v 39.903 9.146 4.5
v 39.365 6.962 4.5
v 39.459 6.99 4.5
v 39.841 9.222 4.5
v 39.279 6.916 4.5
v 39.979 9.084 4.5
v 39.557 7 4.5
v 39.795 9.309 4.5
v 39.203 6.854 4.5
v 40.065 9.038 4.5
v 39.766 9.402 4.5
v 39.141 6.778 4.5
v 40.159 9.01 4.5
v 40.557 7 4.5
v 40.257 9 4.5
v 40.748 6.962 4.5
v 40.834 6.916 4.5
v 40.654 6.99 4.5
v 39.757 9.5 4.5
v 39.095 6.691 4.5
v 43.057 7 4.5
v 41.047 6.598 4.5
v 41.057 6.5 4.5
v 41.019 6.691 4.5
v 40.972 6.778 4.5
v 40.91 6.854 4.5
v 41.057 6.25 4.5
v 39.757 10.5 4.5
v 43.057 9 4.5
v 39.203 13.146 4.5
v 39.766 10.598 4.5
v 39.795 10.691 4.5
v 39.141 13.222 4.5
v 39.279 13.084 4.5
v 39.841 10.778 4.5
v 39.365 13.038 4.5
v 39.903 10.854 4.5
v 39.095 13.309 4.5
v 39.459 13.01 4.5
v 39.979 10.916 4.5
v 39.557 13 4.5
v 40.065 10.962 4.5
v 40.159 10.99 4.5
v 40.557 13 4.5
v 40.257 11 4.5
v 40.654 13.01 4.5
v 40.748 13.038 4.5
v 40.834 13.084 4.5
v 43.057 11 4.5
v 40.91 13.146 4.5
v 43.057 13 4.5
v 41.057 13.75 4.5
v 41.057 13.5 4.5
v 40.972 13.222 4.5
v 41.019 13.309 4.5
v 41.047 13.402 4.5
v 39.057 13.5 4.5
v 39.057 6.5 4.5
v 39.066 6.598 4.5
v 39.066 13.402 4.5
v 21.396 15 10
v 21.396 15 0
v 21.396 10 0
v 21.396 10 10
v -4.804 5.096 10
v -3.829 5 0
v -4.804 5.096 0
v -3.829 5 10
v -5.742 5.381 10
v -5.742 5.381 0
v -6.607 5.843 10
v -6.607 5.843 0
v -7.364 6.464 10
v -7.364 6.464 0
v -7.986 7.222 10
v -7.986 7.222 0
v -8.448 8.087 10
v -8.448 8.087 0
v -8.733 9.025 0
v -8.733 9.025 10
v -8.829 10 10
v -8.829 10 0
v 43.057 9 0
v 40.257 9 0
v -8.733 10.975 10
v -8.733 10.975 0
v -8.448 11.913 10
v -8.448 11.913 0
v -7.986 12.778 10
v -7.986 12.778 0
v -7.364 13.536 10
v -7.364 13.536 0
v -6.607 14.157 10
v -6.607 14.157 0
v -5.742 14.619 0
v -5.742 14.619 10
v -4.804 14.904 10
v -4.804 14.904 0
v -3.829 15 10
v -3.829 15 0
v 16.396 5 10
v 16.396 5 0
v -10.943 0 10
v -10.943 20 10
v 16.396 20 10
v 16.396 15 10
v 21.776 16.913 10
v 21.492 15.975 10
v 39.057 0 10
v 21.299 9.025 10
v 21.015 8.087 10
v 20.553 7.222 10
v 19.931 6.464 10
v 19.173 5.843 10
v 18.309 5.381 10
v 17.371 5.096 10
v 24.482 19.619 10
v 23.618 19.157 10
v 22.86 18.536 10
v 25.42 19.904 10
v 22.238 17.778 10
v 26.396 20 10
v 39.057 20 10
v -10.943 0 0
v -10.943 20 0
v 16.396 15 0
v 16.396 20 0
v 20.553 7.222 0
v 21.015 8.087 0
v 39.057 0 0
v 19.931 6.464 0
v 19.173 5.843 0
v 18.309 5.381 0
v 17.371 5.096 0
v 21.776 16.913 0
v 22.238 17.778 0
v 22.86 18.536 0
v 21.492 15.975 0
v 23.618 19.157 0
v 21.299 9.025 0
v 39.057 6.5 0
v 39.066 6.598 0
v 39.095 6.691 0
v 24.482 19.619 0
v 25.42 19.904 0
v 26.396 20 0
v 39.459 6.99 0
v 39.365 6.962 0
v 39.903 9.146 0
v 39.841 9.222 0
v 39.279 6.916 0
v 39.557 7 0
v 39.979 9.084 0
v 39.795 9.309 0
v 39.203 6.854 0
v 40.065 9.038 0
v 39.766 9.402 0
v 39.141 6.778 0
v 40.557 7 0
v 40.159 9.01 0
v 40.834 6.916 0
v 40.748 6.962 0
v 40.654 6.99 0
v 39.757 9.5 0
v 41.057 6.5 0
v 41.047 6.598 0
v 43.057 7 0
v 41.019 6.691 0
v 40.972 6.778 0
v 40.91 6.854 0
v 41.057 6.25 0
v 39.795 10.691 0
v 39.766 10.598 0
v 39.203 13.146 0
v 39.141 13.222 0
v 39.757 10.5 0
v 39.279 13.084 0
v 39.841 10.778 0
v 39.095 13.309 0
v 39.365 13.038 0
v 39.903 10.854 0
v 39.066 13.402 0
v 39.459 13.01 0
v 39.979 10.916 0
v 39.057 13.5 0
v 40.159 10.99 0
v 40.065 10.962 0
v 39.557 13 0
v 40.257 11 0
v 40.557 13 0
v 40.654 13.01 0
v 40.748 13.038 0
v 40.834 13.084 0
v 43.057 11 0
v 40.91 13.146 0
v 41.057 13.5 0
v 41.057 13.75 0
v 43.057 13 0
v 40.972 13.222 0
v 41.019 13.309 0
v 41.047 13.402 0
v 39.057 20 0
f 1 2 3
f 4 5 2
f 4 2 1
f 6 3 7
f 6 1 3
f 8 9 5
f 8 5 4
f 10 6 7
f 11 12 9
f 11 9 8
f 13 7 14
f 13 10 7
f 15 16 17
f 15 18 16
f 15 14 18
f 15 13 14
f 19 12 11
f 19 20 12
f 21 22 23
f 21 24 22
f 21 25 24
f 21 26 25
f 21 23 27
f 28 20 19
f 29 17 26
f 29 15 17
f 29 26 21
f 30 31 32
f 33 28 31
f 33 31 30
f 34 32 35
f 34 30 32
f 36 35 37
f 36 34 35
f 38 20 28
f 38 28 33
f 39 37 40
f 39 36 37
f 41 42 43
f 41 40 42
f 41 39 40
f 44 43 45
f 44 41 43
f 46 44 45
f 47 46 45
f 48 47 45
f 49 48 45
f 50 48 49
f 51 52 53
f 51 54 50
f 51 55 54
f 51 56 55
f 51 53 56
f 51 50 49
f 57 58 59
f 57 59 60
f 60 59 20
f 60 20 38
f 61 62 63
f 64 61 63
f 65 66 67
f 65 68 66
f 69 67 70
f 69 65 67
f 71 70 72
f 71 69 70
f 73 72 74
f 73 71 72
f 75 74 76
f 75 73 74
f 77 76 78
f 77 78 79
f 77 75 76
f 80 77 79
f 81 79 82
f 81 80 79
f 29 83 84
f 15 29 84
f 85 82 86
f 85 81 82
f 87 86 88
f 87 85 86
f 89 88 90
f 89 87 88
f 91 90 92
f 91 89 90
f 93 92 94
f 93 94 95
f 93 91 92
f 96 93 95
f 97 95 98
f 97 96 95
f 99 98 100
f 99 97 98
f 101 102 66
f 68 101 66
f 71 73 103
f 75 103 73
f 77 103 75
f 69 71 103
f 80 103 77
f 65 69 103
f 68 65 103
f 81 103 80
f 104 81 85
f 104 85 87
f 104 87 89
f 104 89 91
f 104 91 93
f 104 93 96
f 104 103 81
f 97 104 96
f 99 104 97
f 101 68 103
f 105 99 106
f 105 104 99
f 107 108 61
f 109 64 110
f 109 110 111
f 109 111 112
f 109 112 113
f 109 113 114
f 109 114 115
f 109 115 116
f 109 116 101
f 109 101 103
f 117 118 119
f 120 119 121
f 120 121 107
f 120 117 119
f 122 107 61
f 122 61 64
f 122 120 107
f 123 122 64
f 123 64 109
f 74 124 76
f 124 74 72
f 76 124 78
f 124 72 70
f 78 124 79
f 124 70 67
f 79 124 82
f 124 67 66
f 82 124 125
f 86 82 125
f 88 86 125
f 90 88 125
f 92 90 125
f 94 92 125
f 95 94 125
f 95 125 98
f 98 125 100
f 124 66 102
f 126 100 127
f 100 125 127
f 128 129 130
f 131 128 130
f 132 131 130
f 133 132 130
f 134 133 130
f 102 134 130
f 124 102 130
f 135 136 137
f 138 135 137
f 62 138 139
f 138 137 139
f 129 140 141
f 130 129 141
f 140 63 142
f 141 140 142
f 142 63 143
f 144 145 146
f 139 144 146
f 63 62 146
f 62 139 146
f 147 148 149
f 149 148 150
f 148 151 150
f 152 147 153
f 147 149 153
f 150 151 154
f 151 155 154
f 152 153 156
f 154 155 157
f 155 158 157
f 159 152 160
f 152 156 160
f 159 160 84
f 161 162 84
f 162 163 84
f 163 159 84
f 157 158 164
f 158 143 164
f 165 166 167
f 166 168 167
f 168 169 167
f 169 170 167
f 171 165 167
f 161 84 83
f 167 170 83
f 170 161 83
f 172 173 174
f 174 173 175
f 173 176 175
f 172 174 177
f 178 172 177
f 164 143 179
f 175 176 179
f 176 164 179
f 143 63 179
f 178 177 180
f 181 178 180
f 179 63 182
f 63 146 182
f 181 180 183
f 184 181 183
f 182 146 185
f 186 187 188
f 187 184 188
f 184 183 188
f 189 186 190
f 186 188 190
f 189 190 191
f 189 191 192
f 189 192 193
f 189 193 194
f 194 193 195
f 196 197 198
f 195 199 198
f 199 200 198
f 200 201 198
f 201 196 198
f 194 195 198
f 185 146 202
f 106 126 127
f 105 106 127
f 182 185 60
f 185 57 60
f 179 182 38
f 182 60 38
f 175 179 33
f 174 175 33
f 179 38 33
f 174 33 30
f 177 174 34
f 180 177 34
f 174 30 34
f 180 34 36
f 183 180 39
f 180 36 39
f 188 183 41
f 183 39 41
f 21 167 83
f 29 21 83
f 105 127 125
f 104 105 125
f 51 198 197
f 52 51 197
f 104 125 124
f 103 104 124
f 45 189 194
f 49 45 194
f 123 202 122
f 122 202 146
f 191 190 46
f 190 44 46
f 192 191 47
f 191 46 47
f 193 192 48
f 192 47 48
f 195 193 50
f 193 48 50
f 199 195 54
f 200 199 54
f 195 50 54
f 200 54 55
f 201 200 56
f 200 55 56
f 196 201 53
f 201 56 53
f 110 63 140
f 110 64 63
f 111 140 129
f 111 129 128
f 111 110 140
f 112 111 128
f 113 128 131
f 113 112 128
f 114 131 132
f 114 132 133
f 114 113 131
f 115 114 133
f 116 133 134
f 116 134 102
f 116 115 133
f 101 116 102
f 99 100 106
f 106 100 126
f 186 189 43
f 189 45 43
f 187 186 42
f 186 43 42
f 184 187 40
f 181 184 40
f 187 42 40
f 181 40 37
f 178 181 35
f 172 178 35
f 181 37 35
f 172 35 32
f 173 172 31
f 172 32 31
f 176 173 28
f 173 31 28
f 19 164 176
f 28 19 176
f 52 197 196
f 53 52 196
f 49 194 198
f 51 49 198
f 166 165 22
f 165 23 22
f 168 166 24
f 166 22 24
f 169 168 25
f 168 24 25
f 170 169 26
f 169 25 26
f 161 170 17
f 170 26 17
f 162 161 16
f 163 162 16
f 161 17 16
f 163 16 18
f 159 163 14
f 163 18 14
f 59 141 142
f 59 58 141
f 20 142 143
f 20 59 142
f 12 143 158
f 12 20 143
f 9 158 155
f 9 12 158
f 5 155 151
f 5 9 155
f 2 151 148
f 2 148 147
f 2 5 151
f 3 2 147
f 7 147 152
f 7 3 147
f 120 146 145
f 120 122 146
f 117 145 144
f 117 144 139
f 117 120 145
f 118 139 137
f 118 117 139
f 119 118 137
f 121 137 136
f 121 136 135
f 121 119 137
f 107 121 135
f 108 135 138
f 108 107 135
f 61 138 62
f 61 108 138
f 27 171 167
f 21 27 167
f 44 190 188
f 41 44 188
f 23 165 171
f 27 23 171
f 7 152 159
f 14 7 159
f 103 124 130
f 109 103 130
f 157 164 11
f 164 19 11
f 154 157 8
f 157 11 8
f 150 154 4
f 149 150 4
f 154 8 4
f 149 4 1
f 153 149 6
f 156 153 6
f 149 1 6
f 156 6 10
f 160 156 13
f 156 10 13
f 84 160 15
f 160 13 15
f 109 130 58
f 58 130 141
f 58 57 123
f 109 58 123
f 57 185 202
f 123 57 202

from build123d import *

# Parameters (mm, degrees)
F0_W     = 10.7198789741
F0_H     = 5
F1_DEPTH = 10
F0_W_2   = 2
F0_H_2   = 2
F0_W_3   = 0.7
F2_DEPTH = 4.5
F3_R     = 4.99999
F4_R     = 0.5


# Not quite as in the source:
# - a fillet or chamfer is up to 0.001 mm smaller than in the source, because OpenCascade refuses the exact size


with BuildPart() as f1:
    # F0 (on Top) → F1 (new body)
    with BuildSketch(Plane.XY):
        Polygon((-10.9434188306, 20), (-10.9434188306, 0), (5.6756753474, 0), (5.6756753474, 5), (-8.8288290426, 5), (-8.8288290426, 15), (5.6756753474, 15), (5.6756753474, 20), align=None)
        Polygon((5.6756753474, 5), (5.6756753474, 0), (39.0565811694, 0), (39.0565811694, 7), (39.0565811694, 9), (39.0565811694, 11), (39.0565811694, 13), (39.0565811694, 20), (21.3955543215, 20), (21.3955543215, 15), (21.3955543215, 5), align=None)
        with Locations((11.0356148345, 17.5)):
            Rectangle(F0_W, F0_H)
    extrude(amount=F1_DEPTH)

    # F0 (on Top) → F2 (join)
    with BuildSketch(Plane.XY):
        Polygon((39.0565811694, 9), (39.0565811694, 7), (41.0565811694, 7), (41.0565811694, 9), (39.7565811694, 9), align=None)
        with Locations((42.0565811694, 8)):
            Rectangle(F0_W_2, F0_H_2)
        Polygon((43.0565811694, 7), (41.0565811694, 7), (41.0565811694, 6.25), align=None)
        Polygon((39.0565811694, 13), (39.0565811694, 11), (39.7565811694, 11), (41.0565811694, 11), (41.0565811694, 13), align=None)
        with Locations((42.0565811694, 12)):
            Rectangle(F0_W_2, F0_H_2)
        Polygon((41.0565811694, 13.75), (41.0565811694, 13), (43.0565811694, 13), align=None)
        with Locations((39.4065811694, 10)):
            Rectangle(F0_W_3, F0_H_2)
    extrude(amount=F2_DEPTH)

    # F3 (radius 5 in the source; OpenCascade refuses exactly that, so slightly less here)
    f3_edges = [f1.edges().sort_by_distance(p)[0] for p in [
        (-8.828829, 15, 5),
        (-8.828829, 5, 5),
        (21.395554, 5, 5),
        (21.395554, 20, 5),
    ]]
    fillet(f3_edges, radius=F3_R)

    # F4
    f4_edges = [f1.edges().sort_by_distance(p)[0] for p in [
        (39.056581, 13, 2.25),
        (39.056581, 7, 2.25),
        (41.056581, 7, 2.25),
        (41.056581, 13, 2.25),
        (39.756581, 11, 2.25),
        (39.756581, 9, 2.25),
    ]]
    fillet(f4_edges, radius=F4_R)


solid = f1.part
